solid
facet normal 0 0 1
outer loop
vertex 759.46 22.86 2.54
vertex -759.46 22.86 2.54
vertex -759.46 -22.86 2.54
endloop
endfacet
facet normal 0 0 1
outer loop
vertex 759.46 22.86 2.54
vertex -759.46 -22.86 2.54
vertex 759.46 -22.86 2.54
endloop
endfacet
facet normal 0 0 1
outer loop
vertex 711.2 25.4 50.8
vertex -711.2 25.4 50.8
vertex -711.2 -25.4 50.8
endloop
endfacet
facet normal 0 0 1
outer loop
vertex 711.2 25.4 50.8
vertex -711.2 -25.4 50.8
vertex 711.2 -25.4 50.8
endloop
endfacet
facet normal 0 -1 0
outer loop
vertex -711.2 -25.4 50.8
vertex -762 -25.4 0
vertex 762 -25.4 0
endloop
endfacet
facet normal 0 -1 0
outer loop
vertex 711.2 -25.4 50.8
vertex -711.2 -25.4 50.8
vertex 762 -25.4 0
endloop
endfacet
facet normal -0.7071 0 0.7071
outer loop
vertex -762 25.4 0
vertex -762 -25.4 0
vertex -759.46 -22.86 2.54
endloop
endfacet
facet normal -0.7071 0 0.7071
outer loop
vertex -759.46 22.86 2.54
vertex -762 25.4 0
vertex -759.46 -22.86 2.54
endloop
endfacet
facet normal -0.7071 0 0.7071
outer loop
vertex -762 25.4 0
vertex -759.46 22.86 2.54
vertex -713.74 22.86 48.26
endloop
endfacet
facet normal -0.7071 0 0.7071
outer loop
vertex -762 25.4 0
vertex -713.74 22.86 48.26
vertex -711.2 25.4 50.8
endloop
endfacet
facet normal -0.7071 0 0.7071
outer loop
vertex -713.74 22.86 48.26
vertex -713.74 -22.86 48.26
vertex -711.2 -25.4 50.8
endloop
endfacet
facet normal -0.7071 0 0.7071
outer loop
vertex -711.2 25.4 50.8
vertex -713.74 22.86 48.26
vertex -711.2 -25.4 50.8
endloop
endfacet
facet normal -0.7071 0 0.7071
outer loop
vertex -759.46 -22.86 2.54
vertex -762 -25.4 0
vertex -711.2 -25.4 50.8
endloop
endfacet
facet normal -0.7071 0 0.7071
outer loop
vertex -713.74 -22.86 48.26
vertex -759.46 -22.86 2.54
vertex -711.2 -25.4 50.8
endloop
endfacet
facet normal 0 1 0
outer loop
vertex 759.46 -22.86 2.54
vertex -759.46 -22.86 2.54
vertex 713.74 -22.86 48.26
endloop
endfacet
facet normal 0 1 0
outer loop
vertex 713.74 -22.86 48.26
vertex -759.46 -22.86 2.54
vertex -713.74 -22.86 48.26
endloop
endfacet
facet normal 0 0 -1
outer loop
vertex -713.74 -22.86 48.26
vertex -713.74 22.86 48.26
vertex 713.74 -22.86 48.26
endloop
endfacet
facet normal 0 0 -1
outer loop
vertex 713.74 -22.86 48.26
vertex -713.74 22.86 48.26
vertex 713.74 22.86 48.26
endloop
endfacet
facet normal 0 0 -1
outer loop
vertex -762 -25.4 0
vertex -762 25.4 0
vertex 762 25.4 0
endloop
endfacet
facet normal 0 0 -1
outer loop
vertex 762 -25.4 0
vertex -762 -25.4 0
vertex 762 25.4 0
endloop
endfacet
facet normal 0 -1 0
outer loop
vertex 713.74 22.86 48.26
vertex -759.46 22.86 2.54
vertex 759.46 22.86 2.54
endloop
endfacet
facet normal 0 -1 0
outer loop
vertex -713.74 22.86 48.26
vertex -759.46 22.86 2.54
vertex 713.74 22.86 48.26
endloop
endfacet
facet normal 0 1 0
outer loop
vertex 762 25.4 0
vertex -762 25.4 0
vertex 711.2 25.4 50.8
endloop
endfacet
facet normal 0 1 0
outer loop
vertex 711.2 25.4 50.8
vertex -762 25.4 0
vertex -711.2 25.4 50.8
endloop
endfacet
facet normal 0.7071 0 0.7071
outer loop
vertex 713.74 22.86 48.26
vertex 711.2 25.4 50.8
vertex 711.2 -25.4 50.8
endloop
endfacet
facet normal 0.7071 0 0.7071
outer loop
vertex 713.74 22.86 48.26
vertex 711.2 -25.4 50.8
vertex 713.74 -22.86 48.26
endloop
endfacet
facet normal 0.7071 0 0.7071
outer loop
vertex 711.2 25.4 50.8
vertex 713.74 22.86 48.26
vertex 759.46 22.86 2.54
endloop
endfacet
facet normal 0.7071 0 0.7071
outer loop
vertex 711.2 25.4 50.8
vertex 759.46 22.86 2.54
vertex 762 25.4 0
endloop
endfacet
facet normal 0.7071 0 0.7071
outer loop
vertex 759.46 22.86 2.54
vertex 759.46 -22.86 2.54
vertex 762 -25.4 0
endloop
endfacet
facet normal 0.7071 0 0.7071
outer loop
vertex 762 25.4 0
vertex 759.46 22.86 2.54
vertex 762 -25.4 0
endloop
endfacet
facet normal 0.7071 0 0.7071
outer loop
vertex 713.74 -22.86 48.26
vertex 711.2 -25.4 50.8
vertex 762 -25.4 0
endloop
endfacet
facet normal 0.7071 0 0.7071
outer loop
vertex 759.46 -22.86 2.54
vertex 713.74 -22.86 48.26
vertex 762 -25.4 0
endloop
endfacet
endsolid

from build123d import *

# Parameters (mm, degrees)
F0_W     = 1524
F0_H     = 50.8
F1_DEPTH = 50.8
F2_T     = -2.54
F4_DEPTH = 50.801
F6_DEPTH = 50.801


with BuildPart() as f1:
    # F0 (on Top) → F1 (new body)
    with BuildSketch(Plane.XY):
        Rectangle(F0_W, F0_H)
    extrude(amount=F1_DEPTH)

    # F2
    f2_openings = [f1.faces().sort_by_distance(p)[0] for p in [
        (-762, 0, 25.4),
        (762, 0, 25.4),
    ]]
    offset(amount=F2_T, openings=f2_openings)

    # F3 (on face) → F4 (cut, through all)
    with BuildSketch(Plane.XZ.offset(25.4)):
        Polygon((711.2, 50.8), (762, 0), (762, 50.8), align=None)
    extrude(amount=-F4_DEPTH, mode=Mode.SUBTRACT)

    # F5 (on face) → F6 (cut, through all)
    with BuildSketch(Plane.XZ.offset(25.4)):
        Polygon((-762, 50.8), (-762, 0), (-711.2, 50.8), align=None)
    extrude(amount=-F6_DEPTH, mode=Mode.SUBTRACT)


solid = f1.part
